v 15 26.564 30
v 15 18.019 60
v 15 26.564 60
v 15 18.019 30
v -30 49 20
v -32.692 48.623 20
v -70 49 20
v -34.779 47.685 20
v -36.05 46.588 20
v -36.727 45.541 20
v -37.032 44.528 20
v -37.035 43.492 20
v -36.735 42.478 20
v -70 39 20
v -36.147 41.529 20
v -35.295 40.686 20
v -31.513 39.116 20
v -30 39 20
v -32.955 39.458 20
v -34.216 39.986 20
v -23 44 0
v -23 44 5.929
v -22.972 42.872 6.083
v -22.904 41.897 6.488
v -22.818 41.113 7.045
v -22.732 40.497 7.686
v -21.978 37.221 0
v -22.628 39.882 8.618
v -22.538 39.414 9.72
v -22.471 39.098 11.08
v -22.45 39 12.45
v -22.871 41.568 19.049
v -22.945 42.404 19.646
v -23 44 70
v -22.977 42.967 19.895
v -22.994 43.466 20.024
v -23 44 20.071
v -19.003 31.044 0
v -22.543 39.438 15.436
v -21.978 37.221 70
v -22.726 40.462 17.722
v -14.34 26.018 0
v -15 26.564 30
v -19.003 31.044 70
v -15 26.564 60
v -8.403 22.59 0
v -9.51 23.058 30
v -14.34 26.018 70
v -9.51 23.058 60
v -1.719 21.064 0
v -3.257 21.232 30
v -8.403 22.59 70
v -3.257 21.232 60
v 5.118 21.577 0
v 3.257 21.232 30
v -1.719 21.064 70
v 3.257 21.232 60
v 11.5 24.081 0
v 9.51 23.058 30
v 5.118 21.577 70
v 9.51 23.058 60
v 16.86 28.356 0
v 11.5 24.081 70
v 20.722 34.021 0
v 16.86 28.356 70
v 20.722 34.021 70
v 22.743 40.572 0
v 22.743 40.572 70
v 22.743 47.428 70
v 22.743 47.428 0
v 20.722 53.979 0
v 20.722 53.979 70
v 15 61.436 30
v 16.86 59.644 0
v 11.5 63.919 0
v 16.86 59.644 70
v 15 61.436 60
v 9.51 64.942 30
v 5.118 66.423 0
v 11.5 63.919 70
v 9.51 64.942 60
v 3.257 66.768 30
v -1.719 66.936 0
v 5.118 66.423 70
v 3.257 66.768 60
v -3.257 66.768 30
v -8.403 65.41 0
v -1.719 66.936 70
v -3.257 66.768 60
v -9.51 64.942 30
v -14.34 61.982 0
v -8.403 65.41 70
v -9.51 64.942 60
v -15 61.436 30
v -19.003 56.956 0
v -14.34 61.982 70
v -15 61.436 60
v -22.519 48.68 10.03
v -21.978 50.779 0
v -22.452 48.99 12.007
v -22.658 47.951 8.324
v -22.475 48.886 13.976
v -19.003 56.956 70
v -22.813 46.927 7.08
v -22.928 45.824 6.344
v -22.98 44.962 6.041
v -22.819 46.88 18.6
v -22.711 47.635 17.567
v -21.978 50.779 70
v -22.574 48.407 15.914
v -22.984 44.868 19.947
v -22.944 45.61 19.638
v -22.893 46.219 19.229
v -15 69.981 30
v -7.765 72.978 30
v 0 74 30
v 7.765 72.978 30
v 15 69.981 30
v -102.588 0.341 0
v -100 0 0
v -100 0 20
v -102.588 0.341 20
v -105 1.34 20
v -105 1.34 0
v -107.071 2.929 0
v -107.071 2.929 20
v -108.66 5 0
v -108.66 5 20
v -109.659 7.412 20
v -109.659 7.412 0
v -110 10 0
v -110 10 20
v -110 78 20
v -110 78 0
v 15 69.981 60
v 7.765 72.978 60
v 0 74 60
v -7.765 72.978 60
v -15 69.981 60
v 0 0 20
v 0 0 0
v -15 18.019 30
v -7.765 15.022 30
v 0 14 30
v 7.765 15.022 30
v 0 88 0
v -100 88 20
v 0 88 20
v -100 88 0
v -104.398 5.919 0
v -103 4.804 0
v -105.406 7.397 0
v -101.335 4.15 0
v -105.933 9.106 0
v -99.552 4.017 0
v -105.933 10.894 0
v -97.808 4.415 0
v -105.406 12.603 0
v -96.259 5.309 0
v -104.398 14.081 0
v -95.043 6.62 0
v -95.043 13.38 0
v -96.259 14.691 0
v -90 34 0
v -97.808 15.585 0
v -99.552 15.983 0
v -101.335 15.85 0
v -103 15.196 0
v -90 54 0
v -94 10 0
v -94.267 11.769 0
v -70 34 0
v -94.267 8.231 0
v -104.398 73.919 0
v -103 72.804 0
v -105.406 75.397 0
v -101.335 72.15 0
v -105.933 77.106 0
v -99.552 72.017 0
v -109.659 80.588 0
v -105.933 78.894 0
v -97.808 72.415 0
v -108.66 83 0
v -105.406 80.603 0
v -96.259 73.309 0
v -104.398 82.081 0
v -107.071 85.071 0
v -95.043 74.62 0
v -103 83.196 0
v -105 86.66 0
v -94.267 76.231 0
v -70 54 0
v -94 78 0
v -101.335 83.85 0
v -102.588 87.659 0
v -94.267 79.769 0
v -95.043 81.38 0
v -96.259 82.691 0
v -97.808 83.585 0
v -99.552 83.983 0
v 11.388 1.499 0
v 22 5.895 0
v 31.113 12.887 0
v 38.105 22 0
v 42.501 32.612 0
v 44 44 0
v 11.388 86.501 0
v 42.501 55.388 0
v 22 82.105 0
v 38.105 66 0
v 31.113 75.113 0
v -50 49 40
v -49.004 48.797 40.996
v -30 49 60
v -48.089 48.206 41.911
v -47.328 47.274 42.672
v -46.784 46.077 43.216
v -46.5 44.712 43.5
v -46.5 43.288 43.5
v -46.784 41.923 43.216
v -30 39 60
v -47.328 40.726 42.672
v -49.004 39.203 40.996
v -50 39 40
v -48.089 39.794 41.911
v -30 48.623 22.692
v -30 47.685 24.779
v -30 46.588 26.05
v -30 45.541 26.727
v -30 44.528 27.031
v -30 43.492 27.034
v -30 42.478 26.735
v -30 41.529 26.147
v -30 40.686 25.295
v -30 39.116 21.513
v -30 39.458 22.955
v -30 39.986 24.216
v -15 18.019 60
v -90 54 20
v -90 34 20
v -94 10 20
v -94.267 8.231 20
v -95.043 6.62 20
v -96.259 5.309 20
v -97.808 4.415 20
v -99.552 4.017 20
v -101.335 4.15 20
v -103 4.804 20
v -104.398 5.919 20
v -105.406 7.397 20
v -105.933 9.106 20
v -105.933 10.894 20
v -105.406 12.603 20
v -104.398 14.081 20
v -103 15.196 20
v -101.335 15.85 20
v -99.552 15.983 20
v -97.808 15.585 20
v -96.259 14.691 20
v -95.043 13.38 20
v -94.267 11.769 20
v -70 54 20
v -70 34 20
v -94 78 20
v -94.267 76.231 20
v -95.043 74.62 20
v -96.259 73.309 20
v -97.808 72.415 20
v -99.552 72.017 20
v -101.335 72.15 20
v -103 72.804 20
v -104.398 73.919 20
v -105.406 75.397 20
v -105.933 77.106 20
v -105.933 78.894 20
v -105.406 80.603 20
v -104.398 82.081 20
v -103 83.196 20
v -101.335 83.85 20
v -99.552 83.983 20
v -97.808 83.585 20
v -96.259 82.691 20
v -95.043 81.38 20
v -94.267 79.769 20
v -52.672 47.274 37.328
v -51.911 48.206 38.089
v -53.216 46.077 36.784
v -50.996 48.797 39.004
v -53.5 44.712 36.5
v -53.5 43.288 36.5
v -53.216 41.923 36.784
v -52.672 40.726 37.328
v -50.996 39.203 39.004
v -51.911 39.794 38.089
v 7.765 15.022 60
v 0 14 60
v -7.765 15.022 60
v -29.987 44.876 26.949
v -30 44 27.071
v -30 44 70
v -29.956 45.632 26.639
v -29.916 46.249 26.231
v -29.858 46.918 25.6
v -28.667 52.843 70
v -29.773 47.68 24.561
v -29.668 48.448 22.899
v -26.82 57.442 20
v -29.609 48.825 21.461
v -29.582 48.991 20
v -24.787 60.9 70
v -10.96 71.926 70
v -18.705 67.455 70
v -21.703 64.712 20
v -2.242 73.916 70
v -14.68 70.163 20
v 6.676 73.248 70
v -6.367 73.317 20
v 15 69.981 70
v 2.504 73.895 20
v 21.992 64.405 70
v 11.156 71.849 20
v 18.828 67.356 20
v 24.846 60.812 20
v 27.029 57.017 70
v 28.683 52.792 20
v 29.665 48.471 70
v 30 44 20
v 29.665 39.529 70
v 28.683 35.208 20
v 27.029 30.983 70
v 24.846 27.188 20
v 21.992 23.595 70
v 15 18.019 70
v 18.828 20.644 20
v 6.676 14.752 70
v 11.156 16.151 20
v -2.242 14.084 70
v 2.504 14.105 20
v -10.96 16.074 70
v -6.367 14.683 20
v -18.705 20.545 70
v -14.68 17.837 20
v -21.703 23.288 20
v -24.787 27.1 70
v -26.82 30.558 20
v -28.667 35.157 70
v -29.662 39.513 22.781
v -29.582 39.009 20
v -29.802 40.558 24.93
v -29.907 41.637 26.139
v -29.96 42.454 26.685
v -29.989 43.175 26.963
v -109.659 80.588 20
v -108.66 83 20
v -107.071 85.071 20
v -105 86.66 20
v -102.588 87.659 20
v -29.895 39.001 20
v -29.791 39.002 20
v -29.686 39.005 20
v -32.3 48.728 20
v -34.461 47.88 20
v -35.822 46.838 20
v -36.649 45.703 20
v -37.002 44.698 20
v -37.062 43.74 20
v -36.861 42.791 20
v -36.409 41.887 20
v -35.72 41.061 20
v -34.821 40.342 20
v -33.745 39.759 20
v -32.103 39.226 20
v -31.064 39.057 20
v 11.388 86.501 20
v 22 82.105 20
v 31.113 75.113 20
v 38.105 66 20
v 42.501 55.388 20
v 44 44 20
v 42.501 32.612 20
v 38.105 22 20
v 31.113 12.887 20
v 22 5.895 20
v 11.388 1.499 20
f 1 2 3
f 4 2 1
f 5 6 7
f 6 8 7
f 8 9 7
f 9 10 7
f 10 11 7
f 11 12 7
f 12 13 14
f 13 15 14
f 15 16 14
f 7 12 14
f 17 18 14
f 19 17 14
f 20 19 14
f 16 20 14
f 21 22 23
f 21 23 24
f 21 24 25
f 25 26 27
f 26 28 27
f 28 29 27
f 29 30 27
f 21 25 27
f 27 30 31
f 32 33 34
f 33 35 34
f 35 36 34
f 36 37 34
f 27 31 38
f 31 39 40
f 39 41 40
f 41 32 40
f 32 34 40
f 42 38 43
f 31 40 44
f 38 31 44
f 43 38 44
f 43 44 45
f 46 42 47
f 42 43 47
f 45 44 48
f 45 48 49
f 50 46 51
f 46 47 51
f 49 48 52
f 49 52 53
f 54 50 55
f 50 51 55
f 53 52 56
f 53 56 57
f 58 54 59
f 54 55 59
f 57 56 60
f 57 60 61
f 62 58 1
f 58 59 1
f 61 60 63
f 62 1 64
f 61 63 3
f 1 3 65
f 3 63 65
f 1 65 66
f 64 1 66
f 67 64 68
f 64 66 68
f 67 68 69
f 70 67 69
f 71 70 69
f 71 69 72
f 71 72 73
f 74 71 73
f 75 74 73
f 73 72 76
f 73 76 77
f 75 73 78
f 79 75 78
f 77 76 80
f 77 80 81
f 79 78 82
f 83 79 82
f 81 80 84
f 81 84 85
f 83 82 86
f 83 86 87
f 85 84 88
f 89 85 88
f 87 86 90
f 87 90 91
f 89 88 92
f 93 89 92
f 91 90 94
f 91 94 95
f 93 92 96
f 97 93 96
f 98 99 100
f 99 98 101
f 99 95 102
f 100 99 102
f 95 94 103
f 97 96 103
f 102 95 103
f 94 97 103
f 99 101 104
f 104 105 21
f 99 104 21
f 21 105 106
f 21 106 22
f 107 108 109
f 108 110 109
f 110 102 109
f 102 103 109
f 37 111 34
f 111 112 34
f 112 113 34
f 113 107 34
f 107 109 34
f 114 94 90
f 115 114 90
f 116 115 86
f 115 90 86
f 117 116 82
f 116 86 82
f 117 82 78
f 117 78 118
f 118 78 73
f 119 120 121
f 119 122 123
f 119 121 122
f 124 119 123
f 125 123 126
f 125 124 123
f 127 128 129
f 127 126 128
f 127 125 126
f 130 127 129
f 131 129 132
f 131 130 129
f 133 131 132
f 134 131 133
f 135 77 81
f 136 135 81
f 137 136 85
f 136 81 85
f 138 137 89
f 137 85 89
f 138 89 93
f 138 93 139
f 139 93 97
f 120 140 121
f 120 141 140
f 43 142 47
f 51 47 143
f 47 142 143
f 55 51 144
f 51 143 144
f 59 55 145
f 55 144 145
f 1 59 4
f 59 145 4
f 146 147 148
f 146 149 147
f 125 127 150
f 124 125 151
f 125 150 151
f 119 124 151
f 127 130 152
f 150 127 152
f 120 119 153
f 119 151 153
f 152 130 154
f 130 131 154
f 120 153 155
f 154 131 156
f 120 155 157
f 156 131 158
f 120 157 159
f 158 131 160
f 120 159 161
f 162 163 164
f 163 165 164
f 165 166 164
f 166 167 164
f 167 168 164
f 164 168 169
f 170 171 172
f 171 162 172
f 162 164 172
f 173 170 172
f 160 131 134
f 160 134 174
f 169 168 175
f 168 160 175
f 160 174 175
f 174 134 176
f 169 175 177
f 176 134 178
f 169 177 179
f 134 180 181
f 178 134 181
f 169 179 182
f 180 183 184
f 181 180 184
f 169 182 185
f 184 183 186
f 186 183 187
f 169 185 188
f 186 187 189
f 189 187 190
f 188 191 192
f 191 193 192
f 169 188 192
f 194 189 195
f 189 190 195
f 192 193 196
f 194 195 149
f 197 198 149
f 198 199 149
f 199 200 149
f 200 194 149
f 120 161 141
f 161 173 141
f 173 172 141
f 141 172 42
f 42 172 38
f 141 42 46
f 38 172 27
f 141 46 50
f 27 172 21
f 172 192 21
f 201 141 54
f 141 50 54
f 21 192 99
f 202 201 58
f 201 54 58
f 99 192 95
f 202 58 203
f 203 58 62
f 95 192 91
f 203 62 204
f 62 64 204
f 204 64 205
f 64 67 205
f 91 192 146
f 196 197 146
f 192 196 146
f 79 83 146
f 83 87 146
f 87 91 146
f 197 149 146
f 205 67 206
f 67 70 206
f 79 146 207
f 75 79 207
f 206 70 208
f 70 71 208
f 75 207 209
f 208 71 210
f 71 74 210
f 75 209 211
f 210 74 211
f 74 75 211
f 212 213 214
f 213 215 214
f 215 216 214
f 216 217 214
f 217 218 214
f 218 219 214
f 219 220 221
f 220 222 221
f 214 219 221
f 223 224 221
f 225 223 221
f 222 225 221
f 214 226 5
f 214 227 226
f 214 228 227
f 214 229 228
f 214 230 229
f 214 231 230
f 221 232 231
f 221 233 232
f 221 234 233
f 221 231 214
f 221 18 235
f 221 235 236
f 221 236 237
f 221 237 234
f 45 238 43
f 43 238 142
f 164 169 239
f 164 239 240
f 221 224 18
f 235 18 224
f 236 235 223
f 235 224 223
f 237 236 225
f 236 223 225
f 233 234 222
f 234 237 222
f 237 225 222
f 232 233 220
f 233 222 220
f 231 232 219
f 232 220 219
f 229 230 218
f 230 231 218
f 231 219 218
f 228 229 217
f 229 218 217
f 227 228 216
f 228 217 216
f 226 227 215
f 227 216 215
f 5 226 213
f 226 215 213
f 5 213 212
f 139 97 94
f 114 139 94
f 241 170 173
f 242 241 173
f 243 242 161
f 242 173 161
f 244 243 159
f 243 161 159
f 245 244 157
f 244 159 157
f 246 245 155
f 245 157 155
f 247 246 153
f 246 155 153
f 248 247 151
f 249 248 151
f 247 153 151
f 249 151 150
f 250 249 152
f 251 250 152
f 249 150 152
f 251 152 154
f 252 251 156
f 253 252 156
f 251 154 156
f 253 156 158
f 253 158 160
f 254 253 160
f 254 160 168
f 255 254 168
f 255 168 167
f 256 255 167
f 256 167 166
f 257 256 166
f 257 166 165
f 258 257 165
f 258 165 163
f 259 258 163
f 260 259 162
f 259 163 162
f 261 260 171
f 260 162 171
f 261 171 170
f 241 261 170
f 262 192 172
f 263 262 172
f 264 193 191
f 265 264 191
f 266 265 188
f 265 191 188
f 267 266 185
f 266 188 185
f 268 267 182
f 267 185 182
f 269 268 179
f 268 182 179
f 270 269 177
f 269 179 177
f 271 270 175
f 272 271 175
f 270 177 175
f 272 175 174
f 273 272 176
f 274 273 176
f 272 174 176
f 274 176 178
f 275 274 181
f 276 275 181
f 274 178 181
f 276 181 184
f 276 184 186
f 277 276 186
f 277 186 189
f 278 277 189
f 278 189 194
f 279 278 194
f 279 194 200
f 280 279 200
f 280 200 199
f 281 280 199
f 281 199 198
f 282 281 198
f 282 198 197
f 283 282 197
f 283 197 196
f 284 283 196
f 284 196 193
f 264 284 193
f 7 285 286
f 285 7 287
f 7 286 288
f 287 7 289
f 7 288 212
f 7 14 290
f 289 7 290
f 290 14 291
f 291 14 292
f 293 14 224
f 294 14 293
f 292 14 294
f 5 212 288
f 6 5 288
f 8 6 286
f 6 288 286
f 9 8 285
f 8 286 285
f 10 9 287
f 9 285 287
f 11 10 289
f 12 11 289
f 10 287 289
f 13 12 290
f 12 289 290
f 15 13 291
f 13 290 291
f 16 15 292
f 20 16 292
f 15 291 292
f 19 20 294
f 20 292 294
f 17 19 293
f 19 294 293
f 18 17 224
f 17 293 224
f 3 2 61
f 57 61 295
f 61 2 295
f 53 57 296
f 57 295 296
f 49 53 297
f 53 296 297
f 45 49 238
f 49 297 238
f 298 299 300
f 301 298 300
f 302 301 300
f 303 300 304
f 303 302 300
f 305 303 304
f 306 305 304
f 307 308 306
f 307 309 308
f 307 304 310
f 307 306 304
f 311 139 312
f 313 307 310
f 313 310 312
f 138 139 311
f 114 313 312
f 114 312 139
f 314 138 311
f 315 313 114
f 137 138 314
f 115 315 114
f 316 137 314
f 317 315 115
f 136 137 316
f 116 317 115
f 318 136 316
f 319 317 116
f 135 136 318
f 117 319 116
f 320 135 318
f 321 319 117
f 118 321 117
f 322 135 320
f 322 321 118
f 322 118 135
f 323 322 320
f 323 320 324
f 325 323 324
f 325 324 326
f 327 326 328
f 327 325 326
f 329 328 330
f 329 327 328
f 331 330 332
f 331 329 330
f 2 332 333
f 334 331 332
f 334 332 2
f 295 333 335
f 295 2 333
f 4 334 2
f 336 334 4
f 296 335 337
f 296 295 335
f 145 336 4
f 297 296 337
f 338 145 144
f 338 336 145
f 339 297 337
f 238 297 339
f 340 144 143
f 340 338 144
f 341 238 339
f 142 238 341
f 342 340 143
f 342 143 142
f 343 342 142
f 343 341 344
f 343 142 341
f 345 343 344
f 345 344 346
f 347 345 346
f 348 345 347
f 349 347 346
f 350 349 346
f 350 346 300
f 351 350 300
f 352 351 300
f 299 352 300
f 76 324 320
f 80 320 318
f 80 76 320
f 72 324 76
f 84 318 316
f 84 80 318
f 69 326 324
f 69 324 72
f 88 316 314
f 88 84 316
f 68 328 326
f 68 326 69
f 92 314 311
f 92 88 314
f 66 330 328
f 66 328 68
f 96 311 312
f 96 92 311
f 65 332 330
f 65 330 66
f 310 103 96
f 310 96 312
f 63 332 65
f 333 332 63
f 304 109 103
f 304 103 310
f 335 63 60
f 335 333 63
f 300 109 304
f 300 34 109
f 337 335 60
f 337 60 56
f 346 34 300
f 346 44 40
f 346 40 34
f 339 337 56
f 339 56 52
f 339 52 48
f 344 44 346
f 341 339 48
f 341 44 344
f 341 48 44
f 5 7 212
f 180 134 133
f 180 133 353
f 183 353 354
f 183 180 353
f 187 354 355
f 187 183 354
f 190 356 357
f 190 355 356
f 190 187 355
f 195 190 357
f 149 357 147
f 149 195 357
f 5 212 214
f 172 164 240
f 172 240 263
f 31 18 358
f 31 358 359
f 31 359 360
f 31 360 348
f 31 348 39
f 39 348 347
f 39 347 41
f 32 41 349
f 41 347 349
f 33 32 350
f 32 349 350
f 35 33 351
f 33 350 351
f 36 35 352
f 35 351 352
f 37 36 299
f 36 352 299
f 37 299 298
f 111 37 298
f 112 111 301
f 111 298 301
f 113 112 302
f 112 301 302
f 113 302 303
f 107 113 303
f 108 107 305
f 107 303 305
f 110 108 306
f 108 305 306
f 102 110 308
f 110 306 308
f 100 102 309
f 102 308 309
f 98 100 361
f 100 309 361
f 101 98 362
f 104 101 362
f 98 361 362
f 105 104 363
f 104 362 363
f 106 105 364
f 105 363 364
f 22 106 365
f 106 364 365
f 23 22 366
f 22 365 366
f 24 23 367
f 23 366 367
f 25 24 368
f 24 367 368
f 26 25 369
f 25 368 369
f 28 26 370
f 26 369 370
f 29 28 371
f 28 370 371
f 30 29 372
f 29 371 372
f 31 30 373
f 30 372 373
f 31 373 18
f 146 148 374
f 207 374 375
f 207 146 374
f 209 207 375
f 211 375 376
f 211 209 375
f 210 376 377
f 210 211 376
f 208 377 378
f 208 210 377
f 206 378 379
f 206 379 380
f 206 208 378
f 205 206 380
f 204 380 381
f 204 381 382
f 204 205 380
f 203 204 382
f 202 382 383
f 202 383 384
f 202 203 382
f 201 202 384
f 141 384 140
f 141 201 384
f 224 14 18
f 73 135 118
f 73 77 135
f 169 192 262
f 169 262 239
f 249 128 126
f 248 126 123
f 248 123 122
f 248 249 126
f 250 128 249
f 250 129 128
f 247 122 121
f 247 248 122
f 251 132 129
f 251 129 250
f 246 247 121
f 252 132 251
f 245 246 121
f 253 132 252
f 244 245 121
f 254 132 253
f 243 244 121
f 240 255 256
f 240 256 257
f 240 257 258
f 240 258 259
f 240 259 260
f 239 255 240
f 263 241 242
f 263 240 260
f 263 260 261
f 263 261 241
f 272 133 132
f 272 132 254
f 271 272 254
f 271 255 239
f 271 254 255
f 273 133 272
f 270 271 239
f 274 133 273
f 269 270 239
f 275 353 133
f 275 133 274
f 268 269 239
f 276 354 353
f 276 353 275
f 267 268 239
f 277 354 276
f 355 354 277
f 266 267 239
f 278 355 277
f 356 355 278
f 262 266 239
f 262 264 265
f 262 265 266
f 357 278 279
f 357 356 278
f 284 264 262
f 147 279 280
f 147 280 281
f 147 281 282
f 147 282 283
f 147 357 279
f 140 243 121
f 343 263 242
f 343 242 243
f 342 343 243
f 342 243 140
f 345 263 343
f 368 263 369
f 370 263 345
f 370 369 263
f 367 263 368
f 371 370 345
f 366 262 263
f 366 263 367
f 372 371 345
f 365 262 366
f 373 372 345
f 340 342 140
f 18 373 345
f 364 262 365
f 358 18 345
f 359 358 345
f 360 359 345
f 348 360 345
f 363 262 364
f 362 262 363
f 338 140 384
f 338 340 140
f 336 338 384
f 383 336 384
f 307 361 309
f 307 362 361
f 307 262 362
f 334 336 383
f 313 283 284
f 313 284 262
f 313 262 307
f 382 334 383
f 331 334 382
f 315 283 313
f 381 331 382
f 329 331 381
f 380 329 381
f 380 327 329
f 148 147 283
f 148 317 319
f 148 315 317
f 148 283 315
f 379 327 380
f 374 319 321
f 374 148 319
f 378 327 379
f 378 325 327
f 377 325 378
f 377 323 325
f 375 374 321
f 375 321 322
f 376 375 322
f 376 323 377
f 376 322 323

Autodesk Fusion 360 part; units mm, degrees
sketch "Sketch1" plane through (0, 0, 0) normal (0, 0, 1) x (1, 0, 0)
  line L0 (0, 0) -> (-100, 0)
  line L1 (-100, 0) -> (-100, 10)
  line L2 (-100, 10) -> (-110, 10)
  circle A0 centre (-100, 10) radius 10
  circle A1 centre (-100, 10) radius 6
  line L3 (-110, 10) -> (-110, 78)
  line L4 (-110, 78) -> (-100, 78)
  line L5 (-100, 78) -> (-100, 88)
  circle A2 centre (-100, 78) radius 10
  circle A3 centre (-100, 78) radius 6
  line L6 (-100, 88) -> (0, 88)
  line L7 (0, 88) -> (0, 0)
  circle A4 centre (0, 44) radius 44
  line L8 (0, 44) -> (-110, 44)
  line L9 (-110, 44) -> (-80, 44)
  line L10 (-80, 44) -> (-70, 44)
  line L11 (-70, 44) -> (-70, 34)
  line L12 (-70, 34) -> (-80, 34)
  line L13 (-80, 34) -> (-80, 44)
  line L14 (-80, 44) -> (-70, 44)
  line L15 (-70, 44) -> (-70, 54)
  line L16 (-70, 54) -> (-80, 54)
  line L17 (-80, 54) -> (-80, 44)
  line L18 (-80, 44) -> (-90, 44)
  line L19 (-90, 44) -> (-90, 54)
  line L20 (-90, 54) -> (-80, 54)
  line L21 (-80, 54) -> (-80, 44)
  line L22 (-80, 44) -> (-90, 44)
  line L23 (-90, 44) -> (-90, 34)
  line L24 (-90, 34) -> (-80, 34)
  line L25 (-80, 34) -> (-80, 44)
  dimension "d1" = 100
  dimension "d2" = 10
  dimension "d3" = 10
  dimension "d4" = 20
  dimension "d5" = 12
  dimension "d6" = 68
  dimension "d7" = 10
  dimension "d8" = 10
  dimension "d9" = 20
  dimension "d10" = 12
  dimension "d11" = 100
  dimension "d12" = 88
  dimension "d13" = 30
  dimension "d14" = 10
  dimension "d15" = 10
  dimension "d16" = 10
  dimension "d17" = 10
  dimension "d18" = 10
  dimension "d19" = 10
  dimension "d20" = 10
  dimension "d21" = 10
extrude "Extrude1" add sketch "Sketch1" along normal blind 20 contours L7 A4 L8 | L7 A4 | L0 A0 L3 A4 L8 L9 L11 L12 L23 L24 | L1 L2 A0 A1 | L1 L2 A0 A1 | L7 A4 L8 | L3 A2 L6 A4 L8 L9 L15 L16 L19 L20 | L4 L5 A2 A3 | L4 L5 A2 A3 makes body 1
sketch "Sketch2" plane through (0, 0, 20) normal (0, 0, 1) x (-1, 0, 0)
  circle A0 centre (100, -10) radius 6
  circle A1 centre (100, -78) radius 6
  line L0 (90, -34) -> (90, -54)
  line L1 (90, -54) -> (70, -54)
  line L2 (70, -54) -> (70, -34)
  line L3 (70, -34) -> (90, -34)
  arc A2 (110, -10) -> (100, 0) centre (100, -10) ccw
  line L4 (100, 0) -> (0, 0)
  arc A3 (0, 0) -> (0, -88) centre (0, -44) ccw
  line L5 (0, -88) -> (100, -88)
  arc A4 (100, -88) -> (110, -78) centre (100, -78) ccw
  line L6 (110, -78) -> (110, -10)
  line L7 (0, 0) -> (0, -88)
  line L8 (110, -44) -> (0, -44)
  circle A5 centre (0, -44) radius 30
  circle A6 centre (0, -44) radius 23
  dimension "d24" = 60
  dimension "d25" = 46
extrude "Extrude2" add sketch "Sketch2" along normal blind 50 contours L7 L8 A5 A6 | L7 L8 A5 A6 | L7 A5 A6 bodies 1
extrude "Extrude3" cut 1 faces at (5.9607, 51.4744, 20) along direction (0, 0, -1) blind 20 on bodies 1 bodies 1
sketch "Sketch3" plane through (0, 0, 0) normal (0, 1, 0) x (1, 0, 0)
  line L0 (0, -60) -> (-15, -60)
  line L1 (-15, -60) -> (-15, -30)
  line L2 (-15, -30) -> (0, -30)
  line L3 (0, -30) -> (0, -60)
  line L4 (0, -60) -> (15, -60)
  line L5 (15, -60) -> (15, -30)
  line L6 (15, -30) -> (0, -30)
  line L7 (0, -30) -> (0, -60)
  dimension "d31" = 15
  dimension "d32" = 30
  dimension "d33" = 30
extrude "Extrude4" cut sketch "Sketch3" along normal blind 95 bodies 1
sketch "Sketch4" plane through (0, 0, 0) normal (0, 1, 0) x (1, 0, 0)
ref_plane "WorkPlane1" through (-50, 44, 10) normal (0, 1, 0) x (-1, 0, 0)
sketch "Sketch5" plane through (-50, 44, 10) normal (0, 1, 0) x (1, 0, 0)
  line L0 (20, -10) -> (20, -50)
  line L1 (20, -10) -> (-20, -10)
  line L2 (-20, -10) -> (20, -50)
extrude "Extrude5" add sketch "Sketch5" along normal mid plane 10 separate body makes body 2
sketch "Sketch6" plane through (0, 49, 0) normal (0, 1, 0) x (-1, 0, 0)
  line L0 (30, 20) -> (70, 20)
  line L1 (70, 20) -> (30, 60)
  line L2 (30, 60) -> (30, 20)
sketch "Sketch7" plane through (-45, 0, 45) normal (-0.7071, 0, 0.7071) x (0, -1, 0)
  line L0 (-39, 21.2132) -> (-49, 21.2132)
  line L1 (-49, 21.2132) -> (-49, -35.3553)
  line L2 (-49, -35.3553) -> (-39, -35.3553)
  line L3 (-39, -35.3553) -> (-39, 21.2132)
  line L4 (-49, -7.0711) -> (-39, -7.0711)
  circle A0 centre (-44, -7.0711) radius 5
  dimension "d39" = 10
extrude "Extrude6" cut sketch "Sketch7" against normal blind 145 contours L4 A0 | L4 A0 bodies 1 2
